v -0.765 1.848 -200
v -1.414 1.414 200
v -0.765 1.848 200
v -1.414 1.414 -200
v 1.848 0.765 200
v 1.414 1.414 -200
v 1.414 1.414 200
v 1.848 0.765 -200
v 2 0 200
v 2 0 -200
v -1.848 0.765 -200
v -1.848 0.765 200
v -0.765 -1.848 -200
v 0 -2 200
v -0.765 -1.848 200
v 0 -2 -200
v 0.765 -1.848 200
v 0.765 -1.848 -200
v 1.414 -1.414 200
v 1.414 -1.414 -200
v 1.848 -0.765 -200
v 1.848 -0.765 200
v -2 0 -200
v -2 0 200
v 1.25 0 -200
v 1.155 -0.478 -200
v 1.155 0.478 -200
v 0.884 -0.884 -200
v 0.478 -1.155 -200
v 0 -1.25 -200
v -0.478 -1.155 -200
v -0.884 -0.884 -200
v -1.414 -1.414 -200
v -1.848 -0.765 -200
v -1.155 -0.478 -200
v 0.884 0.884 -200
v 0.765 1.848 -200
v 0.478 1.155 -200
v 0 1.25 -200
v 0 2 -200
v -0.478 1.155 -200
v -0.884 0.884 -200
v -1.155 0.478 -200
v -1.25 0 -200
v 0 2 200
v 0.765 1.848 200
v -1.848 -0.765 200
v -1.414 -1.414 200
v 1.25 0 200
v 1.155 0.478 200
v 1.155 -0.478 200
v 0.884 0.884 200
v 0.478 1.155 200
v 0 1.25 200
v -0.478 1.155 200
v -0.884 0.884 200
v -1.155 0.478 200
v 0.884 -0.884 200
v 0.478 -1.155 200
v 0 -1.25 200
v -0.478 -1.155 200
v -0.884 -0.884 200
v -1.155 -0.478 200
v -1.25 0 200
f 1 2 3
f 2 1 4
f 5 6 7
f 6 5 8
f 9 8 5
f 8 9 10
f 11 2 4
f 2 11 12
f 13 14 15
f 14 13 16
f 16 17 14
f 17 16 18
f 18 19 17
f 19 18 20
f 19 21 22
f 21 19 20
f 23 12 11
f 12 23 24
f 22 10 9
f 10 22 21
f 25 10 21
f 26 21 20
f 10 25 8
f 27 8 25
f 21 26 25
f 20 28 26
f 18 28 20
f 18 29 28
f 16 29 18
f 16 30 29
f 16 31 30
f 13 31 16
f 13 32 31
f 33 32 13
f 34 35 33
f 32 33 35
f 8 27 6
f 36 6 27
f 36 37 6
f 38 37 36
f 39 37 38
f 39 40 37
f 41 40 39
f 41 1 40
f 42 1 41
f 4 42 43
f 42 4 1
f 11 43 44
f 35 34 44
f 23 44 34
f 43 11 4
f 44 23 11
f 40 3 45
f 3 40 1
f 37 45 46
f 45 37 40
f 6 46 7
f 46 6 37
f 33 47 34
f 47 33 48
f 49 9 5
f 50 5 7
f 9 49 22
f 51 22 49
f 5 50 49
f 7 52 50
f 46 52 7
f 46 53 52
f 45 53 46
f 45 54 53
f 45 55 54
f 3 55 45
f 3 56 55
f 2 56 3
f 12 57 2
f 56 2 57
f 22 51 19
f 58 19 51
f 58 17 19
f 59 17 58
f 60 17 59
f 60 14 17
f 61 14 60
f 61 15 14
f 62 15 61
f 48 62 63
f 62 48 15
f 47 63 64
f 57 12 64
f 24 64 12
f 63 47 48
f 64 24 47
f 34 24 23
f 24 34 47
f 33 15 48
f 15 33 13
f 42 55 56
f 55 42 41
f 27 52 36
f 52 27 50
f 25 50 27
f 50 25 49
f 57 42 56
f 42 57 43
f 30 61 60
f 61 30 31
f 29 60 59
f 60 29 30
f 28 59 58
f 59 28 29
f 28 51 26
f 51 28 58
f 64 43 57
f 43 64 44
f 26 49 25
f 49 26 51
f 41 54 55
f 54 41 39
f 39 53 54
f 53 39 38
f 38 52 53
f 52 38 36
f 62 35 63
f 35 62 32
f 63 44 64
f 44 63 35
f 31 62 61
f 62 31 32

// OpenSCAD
// COBRA Tendon Guide - 400.0mm

$fn = 16;

difference() {
    cylinder(h=400.0, d=4, center=true);
    cylinder(h=402.0, d=2.5, center=true);
}
